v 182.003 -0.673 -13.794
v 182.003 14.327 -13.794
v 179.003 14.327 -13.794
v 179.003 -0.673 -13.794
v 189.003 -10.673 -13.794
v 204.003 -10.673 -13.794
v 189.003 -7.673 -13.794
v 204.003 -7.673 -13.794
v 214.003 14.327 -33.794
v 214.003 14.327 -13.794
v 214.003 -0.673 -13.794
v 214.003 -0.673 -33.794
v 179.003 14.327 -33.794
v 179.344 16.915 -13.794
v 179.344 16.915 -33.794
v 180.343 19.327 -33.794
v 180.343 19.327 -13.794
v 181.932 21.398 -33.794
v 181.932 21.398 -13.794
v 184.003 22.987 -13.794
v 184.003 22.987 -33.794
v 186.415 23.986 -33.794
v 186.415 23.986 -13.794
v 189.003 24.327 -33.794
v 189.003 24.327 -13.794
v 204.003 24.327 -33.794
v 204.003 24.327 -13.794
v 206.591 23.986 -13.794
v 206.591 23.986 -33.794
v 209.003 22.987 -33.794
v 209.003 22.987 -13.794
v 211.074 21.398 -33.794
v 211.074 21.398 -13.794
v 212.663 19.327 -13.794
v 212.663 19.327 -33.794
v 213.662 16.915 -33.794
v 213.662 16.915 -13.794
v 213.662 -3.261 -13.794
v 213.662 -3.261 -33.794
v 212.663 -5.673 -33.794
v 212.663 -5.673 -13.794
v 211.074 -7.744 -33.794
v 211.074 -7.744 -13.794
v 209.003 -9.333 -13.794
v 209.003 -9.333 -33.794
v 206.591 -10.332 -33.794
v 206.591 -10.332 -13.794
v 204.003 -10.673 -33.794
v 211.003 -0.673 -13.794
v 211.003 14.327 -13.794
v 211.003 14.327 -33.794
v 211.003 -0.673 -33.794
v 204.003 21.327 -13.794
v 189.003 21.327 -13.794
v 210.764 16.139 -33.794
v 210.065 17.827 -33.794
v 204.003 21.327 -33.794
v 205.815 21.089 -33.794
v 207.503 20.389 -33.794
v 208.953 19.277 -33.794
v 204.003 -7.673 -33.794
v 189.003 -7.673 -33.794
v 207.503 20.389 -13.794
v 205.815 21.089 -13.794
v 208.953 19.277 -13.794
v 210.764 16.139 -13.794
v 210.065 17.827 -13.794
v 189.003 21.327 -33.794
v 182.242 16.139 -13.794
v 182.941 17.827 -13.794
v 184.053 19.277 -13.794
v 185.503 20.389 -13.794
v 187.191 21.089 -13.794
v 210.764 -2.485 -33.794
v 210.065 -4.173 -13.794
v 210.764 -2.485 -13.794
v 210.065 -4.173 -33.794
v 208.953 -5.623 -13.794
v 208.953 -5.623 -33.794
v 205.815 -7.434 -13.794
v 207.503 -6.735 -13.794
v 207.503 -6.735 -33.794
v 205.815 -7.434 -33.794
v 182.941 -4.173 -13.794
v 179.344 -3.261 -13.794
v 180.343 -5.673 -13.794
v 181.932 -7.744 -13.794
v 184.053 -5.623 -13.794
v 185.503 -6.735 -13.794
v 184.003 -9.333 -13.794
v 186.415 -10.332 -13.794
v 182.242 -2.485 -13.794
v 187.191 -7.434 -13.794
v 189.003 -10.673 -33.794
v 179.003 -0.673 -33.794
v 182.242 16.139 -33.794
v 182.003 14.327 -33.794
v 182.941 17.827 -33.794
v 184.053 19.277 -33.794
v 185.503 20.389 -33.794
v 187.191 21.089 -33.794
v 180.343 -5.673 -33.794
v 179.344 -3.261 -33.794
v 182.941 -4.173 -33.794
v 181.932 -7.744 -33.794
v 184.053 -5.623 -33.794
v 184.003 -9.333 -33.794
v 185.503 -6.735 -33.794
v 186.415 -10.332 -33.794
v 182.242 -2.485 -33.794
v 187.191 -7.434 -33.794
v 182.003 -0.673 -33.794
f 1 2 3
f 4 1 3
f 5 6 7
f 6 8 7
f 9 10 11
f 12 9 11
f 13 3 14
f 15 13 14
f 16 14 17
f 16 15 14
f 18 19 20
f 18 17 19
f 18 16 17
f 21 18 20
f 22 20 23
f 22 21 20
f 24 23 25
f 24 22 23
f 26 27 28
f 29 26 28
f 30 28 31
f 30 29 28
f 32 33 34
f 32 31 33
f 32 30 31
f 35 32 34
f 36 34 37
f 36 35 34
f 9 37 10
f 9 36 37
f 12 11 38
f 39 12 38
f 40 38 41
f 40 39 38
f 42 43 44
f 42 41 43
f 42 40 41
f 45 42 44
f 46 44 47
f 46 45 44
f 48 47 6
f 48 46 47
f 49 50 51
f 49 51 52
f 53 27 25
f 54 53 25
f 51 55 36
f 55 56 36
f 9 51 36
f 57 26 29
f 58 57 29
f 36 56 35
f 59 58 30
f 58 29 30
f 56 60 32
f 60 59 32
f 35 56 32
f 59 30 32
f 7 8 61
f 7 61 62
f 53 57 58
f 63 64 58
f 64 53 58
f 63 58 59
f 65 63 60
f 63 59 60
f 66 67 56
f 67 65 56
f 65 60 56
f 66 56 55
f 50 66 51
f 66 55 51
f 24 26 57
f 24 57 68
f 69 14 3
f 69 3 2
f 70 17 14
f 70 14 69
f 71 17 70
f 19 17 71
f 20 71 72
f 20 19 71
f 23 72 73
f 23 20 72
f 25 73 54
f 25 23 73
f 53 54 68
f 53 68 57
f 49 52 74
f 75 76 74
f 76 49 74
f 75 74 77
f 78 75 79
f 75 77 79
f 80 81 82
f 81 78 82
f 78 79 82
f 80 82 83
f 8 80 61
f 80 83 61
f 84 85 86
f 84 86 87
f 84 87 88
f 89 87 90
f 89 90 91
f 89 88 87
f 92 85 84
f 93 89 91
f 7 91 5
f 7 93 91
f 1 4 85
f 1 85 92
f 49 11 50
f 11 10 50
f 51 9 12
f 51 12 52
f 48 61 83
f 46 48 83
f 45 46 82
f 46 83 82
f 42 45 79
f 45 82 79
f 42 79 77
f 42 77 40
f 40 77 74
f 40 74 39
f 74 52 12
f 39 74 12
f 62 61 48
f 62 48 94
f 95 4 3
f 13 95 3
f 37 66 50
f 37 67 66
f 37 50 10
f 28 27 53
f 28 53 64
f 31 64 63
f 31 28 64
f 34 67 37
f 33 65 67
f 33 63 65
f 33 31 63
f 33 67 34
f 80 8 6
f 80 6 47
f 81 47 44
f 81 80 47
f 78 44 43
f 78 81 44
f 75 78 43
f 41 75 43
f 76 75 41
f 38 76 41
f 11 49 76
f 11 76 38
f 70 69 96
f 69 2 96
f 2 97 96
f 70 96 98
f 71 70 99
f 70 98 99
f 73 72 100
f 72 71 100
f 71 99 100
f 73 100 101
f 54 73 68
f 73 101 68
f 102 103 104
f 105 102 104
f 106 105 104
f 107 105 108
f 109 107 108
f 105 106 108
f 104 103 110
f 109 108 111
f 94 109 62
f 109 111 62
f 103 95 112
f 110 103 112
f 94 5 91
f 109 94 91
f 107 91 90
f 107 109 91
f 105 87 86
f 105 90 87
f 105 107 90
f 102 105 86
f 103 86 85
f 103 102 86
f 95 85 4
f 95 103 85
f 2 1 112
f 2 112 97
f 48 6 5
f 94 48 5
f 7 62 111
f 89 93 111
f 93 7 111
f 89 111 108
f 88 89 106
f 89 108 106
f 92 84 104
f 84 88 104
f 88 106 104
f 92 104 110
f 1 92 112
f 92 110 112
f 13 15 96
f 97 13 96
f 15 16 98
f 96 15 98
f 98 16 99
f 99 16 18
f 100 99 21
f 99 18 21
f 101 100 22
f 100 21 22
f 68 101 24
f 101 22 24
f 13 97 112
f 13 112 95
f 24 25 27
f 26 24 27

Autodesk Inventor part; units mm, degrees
ref_plane "YZ Plane" through (0, 0, 0) normal (1, 0, 0) x (0, 1, 0)
ref_plane "XZ Plane" through (0, 0, 0) normal (0, 1, 0) x (-1, 0, 0)
ref_plane "XY Plane" through (0, 0, 0) normal (0, 0, 1) x (1, 0, 0)
ref_plane "Work Plane1" through (44.003, -30.6729, -33.7942) normal (0, 0, 1) x (1, 0, 0)
sketch "Sketch1" plane through (44.003, -30.6729, -33.7942) normal (0, 0, 1) x (1, 0, 0)
  line L0 (145, 55) -> (160, 55)
  arc A0 (145, 55) -> (135, 45) centre (145, 45) ccw
  line L1 (135, 30) -> (135, 45)
  arc A1 (135, 30) -> (145, 20) centre (145, 30) ccw
  line L2 (160, 20) -> (145, 20)
  arc A2 (160, 20) -> (170, 30) centre (160, 30) ccw
  line L3 (170, 45) -> (170, 30)
  arc A3 (170, 45) -> (160, 55) centre (160, 45) ccw
  point P0 (-44.003, 30.6729)
surface extrude "ExtrusionSrf1" sketch "Sketch1" along normal blind 20 shown yes curves A3 L0 A0 L1 A1 L2 A2 L3
thicken "Thicken1" operation new thickness 3 both sides no extend neighbours no toward (-0.7330519, 0.6801727, 0) faces at (211.3335, -7.4746, -20.4609) (214.003, 4.3271, -27.1276) (210.8047, 21.6576, -20.4609) (199.003, 24.3271, -27.1276) (181.6724, 21.1289, -20.4609) (179.003, 9.3271, -27.1276) (188.2557, -10.6449, -20.4609) (194.003, -10.6729, -27.1276)
properties part number "CE-8.2.2-01-004"
